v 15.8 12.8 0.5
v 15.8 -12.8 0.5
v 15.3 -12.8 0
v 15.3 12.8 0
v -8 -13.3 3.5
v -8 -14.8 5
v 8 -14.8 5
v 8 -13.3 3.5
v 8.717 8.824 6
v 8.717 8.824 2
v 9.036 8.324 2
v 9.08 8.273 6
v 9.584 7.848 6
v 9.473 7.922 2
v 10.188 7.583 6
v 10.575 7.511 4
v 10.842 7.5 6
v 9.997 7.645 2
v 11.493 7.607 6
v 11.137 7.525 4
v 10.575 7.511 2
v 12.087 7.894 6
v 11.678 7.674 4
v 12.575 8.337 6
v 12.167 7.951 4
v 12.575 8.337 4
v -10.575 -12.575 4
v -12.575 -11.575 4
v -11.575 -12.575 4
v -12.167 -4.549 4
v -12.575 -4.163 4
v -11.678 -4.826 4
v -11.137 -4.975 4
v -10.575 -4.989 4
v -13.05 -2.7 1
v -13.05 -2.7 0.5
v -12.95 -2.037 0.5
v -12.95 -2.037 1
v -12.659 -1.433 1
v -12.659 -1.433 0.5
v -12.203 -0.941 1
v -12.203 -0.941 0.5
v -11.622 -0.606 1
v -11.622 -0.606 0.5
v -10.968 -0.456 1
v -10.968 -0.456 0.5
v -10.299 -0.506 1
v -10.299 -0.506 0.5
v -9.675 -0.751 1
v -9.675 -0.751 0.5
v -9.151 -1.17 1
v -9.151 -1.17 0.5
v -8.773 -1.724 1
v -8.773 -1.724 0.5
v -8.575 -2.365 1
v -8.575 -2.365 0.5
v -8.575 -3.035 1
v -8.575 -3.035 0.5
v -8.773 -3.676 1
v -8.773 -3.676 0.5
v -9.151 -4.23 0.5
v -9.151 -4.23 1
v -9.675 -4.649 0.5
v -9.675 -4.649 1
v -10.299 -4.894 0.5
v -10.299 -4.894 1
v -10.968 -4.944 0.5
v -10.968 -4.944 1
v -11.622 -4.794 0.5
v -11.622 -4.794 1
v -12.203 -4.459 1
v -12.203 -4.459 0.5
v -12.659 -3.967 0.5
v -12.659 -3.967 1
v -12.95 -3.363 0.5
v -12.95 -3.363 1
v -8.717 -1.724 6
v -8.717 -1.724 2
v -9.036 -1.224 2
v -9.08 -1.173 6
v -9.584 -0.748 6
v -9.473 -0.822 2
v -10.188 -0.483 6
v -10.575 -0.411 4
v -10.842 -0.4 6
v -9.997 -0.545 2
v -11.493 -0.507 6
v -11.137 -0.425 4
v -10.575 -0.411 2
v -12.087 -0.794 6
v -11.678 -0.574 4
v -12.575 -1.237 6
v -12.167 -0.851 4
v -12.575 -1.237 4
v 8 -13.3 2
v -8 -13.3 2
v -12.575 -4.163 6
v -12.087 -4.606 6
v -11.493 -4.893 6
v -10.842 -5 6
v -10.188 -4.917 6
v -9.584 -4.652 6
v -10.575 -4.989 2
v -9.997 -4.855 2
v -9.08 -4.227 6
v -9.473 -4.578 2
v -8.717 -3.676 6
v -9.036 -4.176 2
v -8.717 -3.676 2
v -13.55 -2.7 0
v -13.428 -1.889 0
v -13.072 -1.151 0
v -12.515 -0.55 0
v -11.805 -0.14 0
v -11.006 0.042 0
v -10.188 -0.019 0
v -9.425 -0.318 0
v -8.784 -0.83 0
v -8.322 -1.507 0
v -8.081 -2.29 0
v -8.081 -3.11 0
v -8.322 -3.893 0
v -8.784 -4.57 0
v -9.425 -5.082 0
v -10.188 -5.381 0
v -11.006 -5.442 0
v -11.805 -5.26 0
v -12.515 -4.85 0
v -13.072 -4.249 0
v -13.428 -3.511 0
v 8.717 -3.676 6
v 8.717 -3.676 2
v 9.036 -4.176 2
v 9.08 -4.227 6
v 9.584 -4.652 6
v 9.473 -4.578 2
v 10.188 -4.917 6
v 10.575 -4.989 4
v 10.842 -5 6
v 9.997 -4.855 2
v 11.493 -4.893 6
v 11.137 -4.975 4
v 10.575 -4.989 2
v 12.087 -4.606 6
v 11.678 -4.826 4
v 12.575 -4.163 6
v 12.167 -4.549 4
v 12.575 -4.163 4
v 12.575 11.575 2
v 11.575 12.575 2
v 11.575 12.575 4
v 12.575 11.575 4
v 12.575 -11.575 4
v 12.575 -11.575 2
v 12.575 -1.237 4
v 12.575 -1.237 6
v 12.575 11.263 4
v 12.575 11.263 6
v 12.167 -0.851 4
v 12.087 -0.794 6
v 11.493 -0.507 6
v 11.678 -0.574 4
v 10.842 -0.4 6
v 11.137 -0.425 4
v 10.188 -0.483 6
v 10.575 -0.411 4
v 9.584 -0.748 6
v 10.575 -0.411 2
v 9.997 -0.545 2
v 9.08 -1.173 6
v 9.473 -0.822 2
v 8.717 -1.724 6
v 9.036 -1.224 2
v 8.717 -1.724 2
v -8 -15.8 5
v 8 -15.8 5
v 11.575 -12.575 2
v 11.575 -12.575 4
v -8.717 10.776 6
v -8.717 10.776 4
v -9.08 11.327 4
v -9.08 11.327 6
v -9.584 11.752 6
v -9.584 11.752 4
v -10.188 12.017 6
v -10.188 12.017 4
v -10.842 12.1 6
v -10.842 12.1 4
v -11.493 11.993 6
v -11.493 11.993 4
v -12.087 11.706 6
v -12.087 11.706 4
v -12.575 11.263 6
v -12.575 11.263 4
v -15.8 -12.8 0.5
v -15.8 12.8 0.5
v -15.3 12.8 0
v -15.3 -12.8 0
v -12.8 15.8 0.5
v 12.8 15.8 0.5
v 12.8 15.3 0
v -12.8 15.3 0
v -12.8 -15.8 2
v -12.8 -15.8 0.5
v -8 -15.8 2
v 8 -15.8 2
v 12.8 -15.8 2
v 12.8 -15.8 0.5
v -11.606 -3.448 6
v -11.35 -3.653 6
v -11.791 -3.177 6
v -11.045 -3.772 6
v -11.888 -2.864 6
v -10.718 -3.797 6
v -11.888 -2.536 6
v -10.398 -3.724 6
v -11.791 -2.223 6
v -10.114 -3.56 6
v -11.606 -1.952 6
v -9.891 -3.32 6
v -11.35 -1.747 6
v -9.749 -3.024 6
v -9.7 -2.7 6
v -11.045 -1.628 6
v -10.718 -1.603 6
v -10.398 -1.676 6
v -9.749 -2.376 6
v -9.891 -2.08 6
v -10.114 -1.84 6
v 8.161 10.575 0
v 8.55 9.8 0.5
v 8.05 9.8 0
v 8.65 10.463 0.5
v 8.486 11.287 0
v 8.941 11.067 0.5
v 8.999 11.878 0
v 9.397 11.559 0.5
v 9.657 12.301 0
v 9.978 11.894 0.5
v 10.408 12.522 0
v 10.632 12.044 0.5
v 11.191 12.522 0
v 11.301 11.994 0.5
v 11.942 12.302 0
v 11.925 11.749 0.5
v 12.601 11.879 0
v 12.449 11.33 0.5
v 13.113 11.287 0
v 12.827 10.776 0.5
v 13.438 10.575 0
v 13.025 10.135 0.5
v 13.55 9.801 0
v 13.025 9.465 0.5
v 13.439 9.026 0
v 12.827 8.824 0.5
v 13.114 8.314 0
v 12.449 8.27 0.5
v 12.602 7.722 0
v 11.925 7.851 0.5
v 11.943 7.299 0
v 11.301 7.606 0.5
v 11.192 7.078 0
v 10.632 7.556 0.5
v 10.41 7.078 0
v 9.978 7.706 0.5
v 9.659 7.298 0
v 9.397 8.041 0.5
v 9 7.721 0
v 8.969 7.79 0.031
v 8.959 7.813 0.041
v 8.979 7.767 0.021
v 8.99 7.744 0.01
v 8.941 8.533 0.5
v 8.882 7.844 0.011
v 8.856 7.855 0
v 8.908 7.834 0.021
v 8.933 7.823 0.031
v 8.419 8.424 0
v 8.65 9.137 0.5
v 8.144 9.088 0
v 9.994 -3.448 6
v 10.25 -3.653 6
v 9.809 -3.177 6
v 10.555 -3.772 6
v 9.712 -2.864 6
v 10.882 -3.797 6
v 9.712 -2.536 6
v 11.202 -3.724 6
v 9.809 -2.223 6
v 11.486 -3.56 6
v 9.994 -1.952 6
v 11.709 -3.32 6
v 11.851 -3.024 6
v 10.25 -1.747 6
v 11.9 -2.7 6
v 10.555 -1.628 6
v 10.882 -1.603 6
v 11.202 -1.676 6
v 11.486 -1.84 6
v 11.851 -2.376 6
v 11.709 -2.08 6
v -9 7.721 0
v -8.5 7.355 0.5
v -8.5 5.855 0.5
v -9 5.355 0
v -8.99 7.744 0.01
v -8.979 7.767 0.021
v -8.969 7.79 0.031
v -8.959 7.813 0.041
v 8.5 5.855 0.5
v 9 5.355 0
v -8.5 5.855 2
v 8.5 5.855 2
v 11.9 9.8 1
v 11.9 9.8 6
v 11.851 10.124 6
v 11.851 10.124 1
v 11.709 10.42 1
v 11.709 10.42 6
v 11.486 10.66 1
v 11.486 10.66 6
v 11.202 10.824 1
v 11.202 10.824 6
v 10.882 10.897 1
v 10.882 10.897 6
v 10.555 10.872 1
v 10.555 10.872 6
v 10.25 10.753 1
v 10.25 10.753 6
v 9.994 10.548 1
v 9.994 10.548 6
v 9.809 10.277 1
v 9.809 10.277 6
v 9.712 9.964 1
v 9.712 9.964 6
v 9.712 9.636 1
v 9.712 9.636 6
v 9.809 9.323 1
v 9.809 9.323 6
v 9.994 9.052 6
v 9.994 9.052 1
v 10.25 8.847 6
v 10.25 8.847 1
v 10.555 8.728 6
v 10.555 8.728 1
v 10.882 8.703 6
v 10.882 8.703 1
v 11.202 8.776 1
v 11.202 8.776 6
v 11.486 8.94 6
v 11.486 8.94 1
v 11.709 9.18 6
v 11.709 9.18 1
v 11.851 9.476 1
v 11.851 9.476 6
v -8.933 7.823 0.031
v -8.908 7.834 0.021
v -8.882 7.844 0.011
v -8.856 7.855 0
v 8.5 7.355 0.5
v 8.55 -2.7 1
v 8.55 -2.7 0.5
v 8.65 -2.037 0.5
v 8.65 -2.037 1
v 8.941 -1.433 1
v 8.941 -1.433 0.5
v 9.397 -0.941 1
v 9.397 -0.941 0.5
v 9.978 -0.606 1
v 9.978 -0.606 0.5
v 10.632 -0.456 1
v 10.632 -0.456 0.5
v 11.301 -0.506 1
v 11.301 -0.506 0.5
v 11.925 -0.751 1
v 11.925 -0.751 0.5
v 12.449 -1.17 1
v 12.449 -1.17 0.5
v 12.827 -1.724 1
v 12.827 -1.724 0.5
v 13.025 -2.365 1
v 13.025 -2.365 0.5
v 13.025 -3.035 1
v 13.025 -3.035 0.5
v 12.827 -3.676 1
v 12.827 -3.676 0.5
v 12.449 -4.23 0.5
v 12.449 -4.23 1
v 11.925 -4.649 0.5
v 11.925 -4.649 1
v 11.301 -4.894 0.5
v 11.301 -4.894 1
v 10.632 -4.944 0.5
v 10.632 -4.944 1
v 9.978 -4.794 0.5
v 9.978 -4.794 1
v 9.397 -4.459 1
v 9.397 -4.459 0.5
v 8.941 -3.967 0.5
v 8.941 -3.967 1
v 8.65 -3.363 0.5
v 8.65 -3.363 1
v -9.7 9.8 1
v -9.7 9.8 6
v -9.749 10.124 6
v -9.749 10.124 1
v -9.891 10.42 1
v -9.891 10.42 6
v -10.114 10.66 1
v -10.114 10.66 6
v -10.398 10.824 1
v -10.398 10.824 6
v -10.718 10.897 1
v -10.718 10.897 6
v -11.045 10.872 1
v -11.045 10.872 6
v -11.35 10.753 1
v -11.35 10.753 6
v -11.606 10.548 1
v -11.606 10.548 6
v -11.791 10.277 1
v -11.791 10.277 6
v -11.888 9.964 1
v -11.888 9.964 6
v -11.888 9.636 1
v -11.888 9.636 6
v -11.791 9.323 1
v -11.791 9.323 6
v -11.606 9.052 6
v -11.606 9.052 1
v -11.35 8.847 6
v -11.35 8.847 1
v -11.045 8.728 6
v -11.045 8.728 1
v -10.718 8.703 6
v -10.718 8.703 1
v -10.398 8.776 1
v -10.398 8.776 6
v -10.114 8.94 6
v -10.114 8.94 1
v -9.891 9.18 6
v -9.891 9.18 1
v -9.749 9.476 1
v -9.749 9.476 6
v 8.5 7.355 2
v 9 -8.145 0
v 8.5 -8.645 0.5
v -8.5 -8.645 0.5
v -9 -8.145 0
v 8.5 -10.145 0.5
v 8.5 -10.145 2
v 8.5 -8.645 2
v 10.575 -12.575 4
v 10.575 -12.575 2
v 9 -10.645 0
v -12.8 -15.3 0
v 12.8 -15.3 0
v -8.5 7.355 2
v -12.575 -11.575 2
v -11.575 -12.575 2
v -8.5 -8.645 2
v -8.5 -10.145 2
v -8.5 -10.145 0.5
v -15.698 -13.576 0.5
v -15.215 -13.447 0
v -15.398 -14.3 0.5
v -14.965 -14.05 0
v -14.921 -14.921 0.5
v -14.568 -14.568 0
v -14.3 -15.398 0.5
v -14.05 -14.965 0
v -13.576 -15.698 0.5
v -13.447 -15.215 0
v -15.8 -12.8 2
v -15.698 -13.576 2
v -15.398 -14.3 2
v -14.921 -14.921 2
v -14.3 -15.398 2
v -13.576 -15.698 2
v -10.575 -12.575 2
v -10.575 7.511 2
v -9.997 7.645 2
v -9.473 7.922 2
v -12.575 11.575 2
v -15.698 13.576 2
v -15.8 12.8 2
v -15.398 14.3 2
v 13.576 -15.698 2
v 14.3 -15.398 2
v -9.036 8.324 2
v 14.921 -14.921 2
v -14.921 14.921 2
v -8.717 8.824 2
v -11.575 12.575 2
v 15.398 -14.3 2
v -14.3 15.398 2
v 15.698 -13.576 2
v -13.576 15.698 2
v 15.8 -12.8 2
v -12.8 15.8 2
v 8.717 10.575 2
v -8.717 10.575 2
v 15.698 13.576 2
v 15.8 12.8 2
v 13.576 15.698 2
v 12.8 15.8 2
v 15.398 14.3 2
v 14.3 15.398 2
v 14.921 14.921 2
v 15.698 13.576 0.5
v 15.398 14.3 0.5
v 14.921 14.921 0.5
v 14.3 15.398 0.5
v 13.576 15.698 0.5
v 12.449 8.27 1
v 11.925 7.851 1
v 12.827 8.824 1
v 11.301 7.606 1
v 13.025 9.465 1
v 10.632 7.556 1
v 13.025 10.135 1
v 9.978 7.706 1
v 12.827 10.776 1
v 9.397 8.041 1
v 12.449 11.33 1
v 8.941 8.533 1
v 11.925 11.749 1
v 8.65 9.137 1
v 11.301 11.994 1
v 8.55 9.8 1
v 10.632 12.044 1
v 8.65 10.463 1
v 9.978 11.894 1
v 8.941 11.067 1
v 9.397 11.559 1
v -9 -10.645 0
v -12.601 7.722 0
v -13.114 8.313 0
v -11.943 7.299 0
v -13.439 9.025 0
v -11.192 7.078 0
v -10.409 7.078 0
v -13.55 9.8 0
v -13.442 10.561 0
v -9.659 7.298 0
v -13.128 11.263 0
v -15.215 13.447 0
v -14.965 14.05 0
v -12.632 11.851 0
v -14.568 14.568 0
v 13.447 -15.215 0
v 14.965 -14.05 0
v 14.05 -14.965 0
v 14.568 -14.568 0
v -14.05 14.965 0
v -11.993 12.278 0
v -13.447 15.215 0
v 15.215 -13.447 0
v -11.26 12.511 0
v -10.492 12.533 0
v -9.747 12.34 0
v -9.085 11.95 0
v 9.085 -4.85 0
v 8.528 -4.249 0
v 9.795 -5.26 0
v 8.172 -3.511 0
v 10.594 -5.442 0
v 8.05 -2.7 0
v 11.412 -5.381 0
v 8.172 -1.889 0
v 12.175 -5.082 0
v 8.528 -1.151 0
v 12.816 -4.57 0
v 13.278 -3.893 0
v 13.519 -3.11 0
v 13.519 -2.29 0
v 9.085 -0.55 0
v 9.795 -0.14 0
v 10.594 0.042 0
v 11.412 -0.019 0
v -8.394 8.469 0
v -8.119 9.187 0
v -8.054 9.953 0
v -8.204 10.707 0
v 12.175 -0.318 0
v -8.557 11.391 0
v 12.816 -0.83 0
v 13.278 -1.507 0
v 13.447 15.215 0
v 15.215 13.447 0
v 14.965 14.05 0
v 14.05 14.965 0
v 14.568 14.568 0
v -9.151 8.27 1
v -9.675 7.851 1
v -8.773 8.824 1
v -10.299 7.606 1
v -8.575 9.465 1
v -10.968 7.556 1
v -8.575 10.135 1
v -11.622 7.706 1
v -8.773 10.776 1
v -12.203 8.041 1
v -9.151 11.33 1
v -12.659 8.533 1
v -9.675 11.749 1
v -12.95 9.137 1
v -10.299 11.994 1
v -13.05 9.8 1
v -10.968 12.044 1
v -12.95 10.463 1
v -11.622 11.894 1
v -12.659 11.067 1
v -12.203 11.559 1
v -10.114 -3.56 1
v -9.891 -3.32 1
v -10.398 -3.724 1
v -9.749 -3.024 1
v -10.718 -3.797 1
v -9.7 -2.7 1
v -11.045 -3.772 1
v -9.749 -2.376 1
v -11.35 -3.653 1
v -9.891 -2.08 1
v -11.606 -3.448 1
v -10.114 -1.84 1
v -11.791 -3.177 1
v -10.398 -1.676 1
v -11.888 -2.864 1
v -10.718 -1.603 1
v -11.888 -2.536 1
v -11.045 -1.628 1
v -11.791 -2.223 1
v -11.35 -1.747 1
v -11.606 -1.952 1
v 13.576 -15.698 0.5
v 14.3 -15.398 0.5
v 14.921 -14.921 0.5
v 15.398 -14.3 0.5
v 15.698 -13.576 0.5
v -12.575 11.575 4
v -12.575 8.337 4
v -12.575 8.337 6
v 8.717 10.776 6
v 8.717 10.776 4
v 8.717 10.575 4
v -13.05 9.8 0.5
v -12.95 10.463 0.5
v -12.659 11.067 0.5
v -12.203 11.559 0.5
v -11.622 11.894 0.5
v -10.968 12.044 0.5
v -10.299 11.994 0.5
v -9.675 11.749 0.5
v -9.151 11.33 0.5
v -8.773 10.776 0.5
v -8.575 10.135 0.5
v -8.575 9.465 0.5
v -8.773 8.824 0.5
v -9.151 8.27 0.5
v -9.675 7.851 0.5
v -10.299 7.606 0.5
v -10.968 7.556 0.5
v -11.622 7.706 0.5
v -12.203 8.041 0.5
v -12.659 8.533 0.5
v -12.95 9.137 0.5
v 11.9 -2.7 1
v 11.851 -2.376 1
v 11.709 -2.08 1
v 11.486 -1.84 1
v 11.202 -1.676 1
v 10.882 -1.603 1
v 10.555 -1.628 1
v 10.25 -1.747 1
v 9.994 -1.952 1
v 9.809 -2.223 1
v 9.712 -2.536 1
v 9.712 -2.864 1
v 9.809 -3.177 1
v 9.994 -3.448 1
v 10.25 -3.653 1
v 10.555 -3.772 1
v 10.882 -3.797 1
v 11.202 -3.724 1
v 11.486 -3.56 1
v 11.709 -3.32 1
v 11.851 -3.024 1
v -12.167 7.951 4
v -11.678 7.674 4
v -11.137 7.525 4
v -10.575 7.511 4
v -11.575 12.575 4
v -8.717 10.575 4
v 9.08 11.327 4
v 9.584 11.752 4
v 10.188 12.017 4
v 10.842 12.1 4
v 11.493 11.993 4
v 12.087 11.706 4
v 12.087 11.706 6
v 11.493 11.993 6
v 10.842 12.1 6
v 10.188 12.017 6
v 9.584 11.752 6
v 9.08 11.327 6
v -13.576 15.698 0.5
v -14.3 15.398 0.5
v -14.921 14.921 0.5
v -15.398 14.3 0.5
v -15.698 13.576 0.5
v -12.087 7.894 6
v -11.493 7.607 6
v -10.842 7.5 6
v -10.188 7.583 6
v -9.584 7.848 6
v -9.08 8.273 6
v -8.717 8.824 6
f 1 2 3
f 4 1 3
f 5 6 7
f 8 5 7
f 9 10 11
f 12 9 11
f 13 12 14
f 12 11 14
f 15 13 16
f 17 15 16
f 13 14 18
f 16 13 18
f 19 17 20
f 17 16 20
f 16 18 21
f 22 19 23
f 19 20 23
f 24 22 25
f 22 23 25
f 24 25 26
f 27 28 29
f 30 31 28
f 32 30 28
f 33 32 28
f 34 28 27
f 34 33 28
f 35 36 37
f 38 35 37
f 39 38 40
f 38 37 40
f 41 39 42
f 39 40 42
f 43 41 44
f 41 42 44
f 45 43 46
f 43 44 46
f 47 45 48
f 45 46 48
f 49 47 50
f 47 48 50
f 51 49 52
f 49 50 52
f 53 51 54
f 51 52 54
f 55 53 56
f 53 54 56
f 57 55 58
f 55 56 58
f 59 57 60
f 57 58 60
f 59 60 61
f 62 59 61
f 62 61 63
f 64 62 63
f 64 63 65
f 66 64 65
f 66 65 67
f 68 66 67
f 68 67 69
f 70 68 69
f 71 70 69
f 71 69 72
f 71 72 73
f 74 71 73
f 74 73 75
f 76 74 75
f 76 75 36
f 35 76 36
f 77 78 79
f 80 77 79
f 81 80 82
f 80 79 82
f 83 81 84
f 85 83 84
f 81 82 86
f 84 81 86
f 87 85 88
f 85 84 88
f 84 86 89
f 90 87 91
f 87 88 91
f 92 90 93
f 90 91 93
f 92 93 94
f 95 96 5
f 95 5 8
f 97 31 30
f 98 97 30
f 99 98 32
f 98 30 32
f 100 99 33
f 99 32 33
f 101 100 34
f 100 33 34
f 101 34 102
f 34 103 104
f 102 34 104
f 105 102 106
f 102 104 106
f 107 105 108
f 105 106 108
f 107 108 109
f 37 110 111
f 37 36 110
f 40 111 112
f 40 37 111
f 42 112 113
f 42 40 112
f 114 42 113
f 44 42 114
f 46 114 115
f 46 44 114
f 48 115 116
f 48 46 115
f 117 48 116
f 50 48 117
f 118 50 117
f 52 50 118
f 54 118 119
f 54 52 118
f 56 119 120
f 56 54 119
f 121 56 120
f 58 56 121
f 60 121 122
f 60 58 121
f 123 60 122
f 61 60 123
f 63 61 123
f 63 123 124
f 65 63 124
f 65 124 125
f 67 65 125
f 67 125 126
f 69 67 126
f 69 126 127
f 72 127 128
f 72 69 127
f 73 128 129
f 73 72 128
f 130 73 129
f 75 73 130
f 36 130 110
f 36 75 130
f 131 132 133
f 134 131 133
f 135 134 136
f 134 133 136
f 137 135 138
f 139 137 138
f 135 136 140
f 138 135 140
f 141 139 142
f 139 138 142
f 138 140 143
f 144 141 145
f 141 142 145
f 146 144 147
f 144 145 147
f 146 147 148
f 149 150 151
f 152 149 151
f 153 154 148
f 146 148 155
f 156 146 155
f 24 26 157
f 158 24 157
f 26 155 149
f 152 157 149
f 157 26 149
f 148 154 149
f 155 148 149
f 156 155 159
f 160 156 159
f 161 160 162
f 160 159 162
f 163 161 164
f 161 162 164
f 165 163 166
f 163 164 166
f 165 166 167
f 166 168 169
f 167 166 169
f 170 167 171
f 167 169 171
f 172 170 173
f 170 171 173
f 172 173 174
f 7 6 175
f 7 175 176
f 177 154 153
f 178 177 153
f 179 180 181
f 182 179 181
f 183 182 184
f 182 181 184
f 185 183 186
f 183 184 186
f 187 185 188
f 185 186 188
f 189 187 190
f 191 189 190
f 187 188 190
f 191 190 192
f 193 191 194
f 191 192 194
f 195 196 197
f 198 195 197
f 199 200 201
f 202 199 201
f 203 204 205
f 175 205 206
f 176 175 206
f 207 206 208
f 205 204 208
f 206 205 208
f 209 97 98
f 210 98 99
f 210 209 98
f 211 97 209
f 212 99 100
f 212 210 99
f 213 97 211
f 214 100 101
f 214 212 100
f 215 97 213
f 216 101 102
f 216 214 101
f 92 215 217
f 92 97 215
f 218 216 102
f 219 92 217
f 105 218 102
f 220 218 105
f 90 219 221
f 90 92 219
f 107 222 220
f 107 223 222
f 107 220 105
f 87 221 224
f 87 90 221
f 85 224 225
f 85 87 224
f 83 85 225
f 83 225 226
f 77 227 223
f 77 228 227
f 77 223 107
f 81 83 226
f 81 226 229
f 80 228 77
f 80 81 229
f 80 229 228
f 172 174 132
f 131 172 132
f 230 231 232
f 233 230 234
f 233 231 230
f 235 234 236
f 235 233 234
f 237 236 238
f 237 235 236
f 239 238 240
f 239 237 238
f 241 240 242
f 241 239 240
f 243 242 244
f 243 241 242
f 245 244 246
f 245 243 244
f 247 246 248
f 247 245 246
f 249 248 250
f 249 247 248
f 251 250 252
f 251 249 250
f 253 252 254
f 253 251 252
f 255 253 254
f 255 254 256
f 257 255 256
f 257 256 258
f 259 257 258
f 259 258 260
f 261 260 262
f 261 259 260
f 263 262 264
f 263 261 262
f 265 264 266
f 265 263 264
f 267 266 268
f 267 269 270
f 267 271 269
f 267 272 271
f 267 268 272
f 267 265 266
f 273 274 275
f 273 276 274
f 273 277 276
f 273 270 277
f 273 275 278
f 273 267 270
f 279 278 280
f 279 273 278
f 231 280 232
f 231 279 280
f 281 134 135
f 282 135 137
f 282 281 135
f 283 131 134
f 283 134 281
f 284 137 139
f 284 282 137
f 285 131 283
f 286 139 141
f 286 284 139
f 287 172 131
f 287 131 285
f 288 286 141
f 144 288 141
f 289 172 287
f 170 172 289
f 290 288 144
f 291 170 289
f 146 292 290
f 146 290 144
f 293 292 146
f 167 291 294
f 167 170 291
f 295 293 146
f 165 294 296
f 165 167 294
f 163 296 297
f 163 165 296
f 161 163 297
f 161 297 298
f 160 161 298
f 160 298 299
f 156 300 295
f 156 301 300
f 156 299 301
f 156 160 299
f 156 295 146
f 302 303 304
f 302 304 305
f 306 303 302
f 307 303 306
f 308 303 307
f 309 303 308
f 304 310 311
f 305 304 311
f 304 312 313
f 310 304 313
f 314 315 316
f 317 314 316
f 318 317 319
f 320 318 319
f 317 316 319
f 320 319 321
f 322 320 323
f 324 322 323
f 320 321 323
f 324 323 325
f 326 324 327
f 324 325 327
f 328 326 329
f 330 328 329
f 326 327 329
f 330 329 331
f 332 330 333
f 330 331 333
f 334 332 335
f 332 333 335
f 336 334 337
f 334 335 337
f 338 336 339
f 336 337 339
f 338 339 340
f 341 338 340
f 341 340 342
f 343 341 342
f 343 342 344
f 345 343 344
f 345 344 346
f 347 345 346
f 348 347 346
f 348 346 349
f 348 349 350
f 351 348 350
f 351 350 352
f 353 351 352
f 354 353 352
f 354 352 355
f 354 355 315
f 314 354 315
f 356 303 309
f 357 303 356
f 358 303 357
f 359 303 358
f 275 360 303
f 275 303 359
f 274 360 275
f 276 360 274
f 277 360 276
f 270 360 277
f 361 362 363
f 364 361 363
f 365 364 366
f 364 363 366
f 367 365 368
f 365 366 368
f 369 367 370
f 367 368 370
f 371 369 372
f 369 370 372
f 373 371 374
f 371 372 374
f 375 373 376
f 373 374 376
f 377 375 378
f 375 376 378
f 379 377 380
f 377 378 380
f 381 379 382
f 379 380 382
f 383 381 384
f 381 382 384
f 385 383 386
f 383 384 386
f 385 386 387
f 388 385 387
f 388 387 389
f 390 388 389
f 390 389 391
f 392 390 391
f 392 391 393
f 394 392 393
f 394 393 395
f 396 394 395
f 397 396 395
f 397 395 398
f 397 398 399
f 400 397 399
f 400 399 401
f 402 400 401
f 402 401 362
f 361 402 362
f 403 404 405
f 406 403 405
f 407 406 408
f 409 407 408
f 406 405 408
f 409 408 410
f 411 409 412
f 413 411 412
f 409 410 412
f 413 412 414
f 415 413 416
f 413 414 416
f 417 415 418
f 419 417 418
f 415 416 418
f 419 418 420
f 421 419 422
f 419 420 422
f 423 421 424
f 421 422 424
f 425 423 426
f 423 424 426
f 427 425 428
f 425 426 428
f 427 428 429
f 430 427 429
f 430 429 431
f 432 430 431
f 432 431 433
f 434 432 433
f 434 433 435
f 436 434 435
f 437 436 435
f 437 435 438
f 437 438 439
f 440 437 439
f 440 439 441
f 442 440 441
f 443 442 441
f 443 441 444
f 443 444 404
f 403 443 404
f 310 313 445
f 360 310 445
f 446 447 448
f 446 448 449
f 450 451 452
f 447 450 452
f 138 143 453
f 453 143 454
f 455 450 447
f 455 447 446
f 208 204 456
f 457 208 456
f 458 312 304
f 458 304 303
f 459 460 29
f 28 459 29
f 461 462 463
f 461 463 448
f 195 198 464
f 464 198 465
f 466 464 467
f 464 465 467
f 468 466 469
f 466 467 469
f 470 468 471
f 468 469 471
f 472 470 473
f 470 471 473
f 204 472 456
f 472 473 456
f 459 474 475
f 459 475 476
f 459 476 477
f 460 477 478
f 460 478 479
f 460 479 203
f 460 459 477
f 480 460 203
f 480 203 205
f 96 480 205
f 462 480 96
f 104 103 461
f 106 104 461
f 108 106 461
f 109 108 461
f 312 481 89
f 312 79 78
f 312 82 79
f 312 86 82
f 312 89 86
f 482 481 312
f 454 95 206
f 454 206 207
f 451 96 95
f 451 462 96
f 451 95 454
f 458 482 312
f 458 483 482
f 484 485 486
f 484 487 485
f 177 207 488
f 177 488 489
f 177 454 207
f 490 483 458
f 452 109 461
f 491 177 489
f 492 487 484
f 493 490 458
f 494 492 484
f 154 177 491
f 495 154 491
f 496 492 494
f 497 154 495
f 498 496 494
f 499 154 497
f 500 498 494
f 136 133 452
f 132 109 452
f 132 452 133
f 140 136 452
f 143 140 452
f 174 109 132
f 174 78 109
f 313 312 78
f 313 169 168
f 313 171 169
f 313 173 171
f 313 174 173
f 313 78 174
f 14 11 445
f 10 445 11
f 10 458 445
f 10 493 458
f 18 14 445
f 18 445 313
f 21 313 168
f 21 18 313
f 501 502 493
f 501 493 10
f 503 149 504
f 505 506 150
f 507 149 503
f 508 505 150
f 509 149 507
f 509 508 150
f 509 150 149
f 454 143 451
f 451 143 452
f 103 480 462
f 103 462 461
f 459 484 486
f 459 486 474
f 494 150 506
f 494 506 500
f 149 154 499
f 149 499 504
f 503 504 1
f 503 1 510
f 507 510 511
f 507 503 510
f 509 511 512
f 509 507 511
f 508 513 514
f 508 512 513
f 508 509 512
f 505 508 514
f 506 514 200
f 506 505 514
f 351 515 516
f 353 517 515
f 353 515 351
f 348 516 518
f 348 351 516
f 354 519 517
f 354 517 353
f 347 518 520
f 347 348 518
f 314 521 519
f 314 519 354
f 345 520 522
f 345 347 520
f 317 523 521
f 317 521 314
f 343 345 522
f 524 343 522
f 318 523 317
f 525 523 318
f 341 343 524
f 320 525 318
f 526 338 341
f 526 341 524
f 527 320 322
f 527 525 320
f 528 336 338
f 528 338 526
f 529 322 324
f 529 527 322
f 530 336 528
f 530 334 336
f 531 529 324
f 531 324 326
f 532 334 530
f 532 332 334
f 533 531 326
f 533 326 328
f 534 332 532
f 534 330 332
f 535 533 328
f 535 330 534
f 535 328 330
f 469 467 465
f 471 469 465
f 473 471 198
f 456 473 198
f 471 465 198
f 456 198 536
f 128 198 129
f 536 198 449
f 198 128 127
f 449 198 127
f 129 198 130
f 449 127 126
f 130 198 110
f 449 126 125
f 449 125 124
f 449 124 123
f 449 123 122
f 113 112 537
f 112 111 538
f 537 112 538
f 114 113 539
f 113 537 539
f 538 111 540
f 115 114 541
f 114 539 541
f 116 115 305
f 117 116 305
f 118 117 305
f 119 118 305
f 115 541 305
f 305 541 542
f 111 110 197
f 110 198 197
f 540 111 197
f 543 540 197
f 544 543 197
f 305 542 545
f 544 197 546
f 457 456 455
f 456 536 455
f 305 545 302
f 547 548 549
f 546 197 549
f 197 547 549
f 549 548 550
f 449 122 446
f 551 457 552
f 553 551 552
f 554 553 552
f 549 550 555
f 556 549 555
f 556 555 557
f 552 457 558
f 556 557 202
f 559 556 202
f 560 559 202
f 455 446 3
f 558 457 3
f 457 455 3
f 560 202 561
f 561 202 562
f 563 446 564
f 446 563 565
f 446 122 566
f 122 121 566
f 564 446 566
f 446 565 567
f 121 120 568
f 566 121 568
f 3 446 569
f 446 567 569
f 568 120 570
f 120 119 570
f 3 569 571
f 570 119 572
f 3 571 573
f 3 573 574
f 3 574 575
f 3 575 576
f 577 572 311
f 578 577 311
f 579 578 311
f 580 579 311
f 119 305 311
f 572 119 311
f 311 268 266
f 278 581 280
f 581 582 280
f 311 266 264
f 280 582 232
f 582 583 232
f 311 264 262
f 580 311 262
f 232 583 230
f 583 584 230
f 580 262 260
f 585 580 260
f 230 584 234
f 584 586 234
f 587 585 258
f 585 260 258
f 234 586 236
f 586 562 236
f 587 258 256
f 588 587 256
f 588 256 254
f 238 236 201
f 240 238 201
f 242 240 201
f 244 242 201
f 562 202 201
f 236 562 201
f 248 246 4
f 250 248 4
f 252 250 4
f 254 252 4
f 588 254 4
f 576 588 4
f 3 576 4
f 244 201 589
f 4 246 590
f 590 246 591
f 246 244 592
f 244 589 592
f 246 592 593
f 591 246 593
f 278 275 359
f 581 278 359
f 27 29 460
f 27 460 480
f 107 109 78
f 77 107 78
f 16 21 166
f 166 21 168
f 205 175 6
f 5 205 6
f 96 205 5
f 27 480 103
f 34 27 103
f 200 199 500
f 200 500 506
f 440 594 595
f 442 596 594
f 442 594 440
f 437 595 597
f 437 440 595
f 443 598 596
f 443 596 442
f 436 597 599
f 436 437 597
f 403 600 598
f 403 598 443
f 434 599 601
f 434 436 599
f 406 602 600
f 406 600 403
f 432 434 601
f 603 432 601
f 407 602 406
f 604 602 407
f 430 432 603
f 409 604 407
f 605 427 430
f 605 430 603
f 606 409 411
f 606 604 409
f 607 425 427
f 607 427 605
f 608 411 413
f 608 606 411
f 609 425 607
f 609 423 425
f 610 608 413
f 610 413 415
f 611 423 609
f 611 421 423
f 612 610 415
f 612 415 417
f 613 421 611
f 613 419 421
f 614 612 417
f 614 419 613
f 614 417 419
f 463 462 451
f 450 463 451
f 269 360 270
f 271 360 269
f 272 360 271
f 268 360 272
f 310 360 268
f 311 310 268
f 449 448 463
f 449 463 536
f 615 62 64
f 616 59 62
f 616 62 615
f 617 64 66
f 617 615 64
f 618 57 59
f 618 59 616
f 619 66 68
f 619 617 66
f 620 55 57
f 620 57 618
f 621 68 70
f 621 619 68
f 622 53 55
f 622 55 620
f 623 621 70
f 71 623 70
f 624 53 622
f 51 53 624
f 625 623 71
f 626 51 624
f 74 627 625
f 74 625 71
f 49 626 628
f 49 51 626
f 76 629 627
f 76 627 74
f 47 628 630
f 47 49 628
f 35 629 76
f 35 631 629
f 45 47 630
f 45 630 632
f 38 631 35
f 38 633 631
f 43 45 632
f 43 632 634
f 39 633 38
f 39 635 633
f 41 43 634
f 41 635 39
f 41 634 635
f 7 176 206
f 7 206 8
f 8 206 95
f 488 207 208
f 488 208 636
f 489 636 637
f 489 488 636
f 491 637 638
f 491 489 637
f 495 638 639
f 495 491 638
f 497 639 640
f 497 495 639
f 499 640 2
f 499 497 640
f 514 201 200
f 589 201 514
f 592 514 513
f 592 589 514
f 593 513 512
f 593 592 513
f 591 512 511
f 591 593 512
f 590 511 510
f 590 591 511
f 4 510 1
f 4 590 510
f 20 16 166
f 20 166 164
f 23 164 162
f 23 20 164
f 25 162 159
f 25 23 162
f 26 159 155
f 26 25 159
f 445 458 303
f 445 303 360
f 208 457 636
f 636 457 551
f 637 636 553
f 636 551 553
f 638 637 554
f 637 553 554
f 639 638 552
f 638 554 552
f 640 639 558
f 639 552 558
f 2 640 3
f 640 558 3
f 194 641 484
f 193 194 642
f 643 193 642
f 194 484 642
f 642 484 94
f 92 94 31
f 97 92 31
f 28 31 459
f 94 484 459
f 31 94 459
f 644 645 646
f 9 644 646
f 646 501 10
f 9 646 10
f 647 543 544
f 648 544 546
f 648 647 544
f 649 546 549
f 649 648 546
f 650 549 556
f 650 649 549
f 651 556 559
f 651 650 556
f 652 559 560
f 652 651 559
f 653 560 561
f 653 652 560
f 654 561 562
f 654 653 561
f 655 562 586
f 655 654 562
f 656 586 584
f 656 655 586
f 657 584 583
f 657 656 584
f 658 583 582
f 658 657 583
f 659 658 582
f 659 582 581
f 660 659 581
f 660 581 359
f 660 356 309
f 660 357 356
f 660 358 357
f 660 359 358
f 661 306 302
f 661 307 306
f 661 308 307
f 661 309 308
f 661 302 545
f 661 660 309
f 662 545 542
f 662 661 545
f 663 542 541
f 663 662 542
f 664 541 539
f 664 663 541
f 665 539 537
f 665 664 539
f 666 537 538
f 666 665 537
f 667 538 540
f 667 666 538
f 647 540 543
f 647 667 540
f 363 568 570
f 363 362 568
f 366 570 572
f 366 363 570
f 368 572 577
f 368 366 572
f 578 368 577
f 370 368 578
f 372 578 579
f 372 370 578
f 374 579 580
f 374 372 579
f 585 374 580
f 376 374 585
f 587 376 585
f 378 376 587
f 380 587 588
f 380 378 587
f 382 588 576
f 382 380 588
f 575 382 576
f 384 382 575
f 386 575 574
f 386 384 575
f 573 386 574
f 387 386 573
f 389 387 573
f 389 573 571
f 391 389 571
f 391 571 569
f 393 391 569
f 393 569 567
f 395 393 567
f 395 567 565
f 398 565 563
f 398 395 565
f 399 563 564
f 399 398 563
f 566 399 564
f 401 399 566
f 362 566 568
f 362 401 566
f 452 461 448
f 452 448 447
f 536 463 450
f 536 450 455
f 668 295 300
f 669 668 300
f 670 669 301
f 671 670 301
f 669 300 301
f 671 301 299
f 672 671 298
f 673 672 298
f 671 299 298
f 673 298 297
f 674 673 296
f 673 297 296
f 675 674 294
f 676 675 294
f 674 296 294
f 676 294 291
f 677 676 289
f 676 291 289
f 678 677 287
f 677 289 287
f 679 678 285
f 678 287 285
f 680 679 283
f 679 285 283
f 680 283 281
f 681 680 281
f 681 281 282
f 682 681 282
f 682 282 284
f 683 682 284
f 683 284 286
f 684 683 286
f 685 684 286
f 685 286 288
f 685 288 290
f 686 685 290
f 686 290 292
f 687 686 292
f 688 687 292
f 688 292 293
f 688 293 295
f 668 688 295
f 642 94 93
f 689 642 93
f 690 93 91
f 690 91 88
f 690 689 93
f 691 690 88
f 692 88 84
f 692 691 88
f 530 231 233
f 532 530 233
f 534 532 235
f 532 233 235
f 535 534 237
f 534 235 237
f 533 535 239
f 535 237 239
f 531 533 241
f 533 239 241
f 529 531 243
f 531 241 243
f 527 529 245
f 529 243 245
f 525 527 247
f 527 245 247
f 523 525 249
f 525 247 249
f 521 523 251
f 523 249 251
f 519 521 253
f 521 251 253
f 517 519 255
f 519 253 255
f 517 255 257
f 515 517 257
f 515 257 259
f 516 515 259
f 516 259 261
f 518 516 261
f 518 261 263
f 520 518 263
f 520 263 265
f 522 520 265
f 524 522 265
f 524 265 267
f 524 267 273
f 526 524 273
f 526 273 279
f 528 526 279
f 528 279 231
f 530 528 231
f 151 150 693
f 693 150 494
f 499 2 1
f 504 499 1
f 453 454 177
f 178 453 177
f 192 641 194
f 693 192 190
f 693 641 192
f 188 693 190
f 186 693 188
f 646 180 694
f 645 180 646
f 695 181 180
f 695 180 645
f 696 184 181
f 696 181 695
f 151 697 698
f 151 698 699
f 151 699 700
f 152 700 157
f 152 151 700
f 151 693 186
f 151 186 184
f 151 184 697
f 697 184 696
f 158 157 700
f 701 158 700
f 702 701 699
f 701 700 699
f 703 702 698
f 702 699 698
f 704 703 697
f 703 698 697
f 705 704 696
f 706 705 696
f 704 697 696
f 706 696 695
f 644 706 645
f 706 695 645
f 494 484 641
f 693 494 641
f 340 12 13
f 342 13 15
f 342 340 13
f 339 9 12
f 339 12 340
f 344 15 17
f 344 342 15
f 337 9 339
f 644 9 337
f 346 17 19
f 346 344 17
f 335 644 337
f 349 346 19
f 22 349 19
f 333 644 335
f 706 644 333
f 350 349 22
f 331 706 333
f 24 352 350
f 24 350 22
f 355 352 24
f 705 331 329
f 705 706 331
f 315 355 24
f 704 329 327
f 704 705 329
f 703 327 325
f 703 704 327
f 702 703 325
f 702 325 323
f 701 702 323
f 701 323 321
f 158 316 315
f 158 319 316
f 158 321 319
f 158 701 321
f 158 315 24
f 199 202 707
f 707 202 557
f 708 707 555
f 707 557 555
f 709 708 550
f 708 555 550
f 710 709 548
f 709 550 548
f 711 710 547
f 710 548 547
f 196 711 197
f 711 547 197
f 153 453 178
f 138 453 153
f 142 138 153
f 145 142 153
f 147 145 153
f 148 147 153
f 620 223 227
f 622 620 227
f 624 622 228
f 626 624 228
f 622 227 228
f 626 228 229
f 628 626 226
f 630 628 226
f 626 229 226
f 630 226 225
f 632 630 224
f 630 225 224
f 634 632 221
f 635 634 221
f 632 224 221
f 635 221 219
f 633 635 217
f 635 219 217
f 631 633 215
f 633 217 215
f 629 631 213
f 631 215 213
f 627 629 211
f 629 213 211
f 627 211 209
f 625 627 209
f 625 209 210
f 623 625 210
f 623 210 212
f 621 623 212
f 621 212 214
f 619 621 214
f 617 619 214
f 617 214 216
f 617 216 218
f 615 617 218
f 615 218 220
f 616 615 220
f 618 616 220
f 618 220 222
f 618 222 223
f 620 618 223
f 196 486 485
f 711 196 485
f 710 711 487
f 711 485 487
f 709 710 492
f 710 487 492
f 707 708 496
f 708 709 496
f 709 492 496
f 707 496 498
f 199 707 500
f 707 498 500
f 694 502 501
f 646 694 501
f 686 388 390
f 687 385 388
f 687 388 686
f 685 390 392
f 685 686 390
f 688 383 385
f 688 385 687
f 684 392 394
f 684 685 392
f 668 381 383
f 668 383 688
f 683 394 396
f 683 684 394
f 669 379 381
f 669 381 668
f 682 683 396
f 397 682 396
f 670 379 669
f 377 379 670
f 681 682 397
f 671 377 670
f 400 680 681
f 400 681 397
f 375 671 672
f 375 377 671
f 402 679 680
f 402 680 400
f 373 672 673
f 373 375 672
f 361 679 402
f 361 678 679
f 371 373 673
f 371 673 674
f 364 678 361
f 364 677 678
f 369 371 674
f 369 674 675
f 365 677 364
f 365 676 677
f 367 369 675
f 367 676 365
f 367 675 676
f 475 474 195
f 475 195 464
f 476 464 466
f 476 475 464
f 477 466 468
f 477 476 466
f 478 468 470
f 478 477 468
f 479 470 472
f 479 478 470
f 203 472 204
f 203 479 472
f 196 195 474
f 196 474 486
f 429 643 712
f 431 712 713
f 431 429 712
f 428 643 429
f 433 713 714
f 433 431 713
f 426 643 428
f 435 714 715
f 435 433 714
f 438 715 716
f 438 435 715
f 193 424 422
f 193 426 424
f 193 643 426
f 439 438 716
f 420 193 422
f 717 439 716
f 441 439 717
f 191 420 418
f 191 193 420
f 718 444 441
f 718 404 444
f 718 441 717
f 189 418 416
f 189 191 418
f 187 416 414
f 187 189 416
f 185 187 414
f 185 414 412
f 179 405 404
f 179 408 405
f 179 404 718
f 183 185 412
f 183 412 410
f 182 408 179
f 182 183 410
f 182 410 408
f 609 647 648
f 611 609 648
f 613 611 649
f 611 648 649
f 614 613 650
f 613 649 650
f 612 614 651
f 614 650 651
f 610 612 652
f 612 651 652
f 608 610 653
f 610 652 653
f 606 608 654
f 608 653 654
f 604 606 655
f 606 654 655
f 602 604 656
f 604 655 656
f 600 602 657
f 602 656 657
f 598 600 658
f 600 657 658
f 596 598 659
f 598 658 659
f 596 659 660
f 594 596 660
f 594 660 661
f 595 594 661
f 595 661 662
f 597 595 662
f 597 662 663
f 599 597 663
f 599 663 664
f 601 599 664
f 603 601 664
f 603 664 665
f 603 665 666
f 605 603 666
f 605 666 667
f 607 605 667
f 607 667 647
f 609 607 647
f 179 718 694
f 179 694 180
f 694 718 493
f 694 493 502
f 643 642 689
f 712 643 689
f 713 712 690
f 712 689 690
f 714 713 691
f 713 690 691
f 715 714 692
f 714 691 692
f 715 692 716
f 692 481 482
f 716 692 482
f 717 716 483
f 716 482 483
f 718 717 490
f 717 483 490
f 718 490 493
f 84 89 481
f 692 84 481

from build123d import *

# Parameters (mm, degrees)
SKETCH2_W           = 31.6
SKETCH2_H           = 31.6
BOSS_EXTRUDE1_DEPTH = 2
FILLET1_R           = 3
BOSS_EXTRUDE2_DEPTH = 2
CHAMFER1_SIZE       = 1
SKETCH6_W           = 16
SKETCH6_H           = 2.5
BOSS_EXTRUDE3_DEPTH = 3
BOSS_EXTRUDE4_DEPTH = 4
SKETCH8_R           = 1.1
CUT_EXTRUDE1_DEPTH  = 8
SKETCH9_R           = 2.25
CUT_EXTRUDE2_DEPTH  = 1
SKETCH10_W          = 17
SKETCH10_H          = 1.5
CUT_EXTRUDE3_DEPTH  = 5
CHAMFER2_SIZE       = 0.5
CHAMFER3_SIZE       = 1.5


with BuildPart() as part:
    # Sketch2 → Boss-Extrude1 (new body)
    with BuildSketch(Plane.XY):
        Rectangle(SKETCH2_W, SKETCH2_H)
    extrude(amount=BOSS_EXTRUDE1_DEPTH)

    # Fillet1
    fillet1_edges = [part.edges().sort_by_distance(p)[0] for p in [
        (-15.8, 15.8, 1),
        (15.8, 15.8, 1),
        (15.8, -15.8, 1),
        (-15.8, -15.8, 1),
    ]]
    fillet(fillet1_edges, radius=FILLET1_R)

    # Sketch5 → Boss-Extrude2 (add)
    with BuildSketch(Plane.XY.offset(2)):
        Polygon((-10.575, -12.575), (-10.575, 10.575), (10.575, 10.575), (10.575, -12.575), (12.575, -12.575), (12.575, 12.575), (-12.575, 12.575), (-12.575, -12.575), align=None)
    extrude(amount=BOSS_EXTRUDE2_DEPTH)

    # Chamfer1
    chamfer1_edges = [part.edges().sort_by_distance(p)[0] for p in [
        (-12.575, 12.575, 3),
        (-12.575, -12.575, 3),
        (12.575, -12.575, 3),
        (12.575, 12.575, 3),
    ]]
    chamfer(chamfer1_edges, length=CHAMFER1_SIZE)

    # Sketch6 → Boss-Extrude3 (add)
    with BuildSketch(Plane.XY.offset(2)):
        with Locations((0, -14.55)):
            Rectangle(SKETCH6_W, SKETCH6_H)
    extrude(amount=BOSS_EXTRUDE3_DEPTH)

    # Sketch7 → Boss-Extrude4 (add)
    with BuildSketch(Plane.XY.offset(2)):
        with BuildLine():
            Line((12.575, -4.162660527), (12.575, -1.237339569))
            ThreePointArc((12.575, -1.237339569), (10.512267156, -0.418068914), (8.717472576, -1.723742534))
            Line((8.717472576, -1.723742534), (8.717472576, -3.676257561))
            ThreePointArc((8.717472576, -3.676257561), (10.512267156, -4.981931182), (12.575, -4.162660527))
        make_face()
        with BuildLine():
            Line((-12.575, -1.237339569), (-12.575, -4.162660527))
            ThreePointArc((-12.575, -4.162660527), (-10.512267156, -4.981931182), (-8.717472576, -3.676257561))
            Line((-8.717472576, -3.676257561), (-8.717472576, -1.723742534))
            ThreePointArc((-8.717472576, -1.723742534), (-10.512267156, -0.418068914), (-12.575, -1.237339569))
        make_face()
        with BuildLine():
            Line((-12.575, 11.26266067), (-12.575, 8.337339712))
            ThreePointArc((-12.575, 8.337339712), (-10.512267156, 7.518069057), (-8.717472576, 8.823742677))
            Line((-8.717472576, 8.823742677), (-8.717472576, 10.776257704))
            ThreePointArc((-8.717472576, 10.776257704), (-10.512267156, 12.081931325), (-12.575, 11.26266067))
        make_face()
        with BuildLine():
            Line((12.575, 8.337339712), (12.575, 11.26266067))
            ThreePointArc((12.575, 11.26266067), (10.512267156, 12.081931325), (8.717472576, 10.776257704))
            Line((8.717472576, 10.776257704), (8.717472576, 8.823742677))
            ThreePointArc((8.717472576, 8.823742677), (10.512267156, 7.518069057), (12.575, 8.337339712))
        make_face()
    extrude(amount=BOSS_EXTRUDE4_DEPTH)

    # Sketch8 → Cut-Extrude1 (cut)
    with BuildSketch(Plane.XY.offset(6)):
        with Locations((10.800000191, -2.700000048)):
            Circle(SKETCH8_R)
        with Locations((-10.800000191, -2.700000048)):
            Circle(SKETCH8_R)
        with Locations((-10.800000191, 9.800000191)):
            Circle(SKETCH8_R)
        with Locations((10.800000191, 9.800000191)):
            Circle(SKETCH8_R)
    extrude(amount=-CUT_EXTRUDE1_DEPTH, mode=Mode.SUBTRACT)

    # Sketch9 → Cut-Extrude2 (cut)
    with BuildSketch(Plane(origin=(0, 0, 0), x_dir=(-1, 0, 0), z_dir=(0, 0, -1))):
        with Locations((10.800000191, -2.700000048)):
            Circle(SKETCH9_R)
        with Locations((-10.800000191, -2.700000048)):
            Circle(SKETCH9_R)
        with Locations((-10.800000191, 9.800000191)):
            Circle(SKETCH9_R)
        with Locations((10.800000191, 9.800000191)):
            Circle(SKETCH9_R)
    extrude(amount=-CUT_EXTRUDE2_DEPTH, mode=Mode.SUBTRACT)

    # Sketch10 → Cut-Extrude3 (cut)
    with BuildSketch(Plane.XY.offset(2)):
        with Locations((0, -9.395499737)):
            Rectangle(SKETCH10_W, SKETCH10_H)
        with Locations((0, 6.604500263)):
            Rectangle(SKETCH10_W, SKETCH10_H)
    extrude(amount=-CUT_EXTRUDE3_DEPTH, mode=Mode.SUBTRACT)

    # Chamfer2
    # the kernel refuses this chamfer: 0.5 mm, written as the material it takes off along each edge
    with BuildSketch(Plane(origin=(12.8, 15.8, 0), x_dir=(0, 0.02749587661058563, 0.9996219169112968), z_dir=(-1, 0, 0)), Plane(origin=(-15.8, 12.8, 0), x_dir=(-0.02749587661058563, 0, 0.9996219169112968), z_dir=(0, -1, 0)), Plane(origin=(15.8, -12.8, 0), x_dir=(0.02749587661058563, 0, 0.9996219169112968), z_dir=(0, 1, 0)), Plane(origin=(-12.8, -15.8, 0), x_dir=(0, -0.02749587661058563, 0.9996219169112968), z_dir=(1, 0, 0))) as chamfer2_piece_1:
        Polygon((CHAMFER2_SIZE * 0.999621916911, -CHAMFER2_SIZE * 0.0274958766106), (-CHAMFER2_SIZE * 0.0274958766106, -CHAMFER2_SIZE * 0.999621916911), (0, 0), align=None)
    extrude(amount=25.6, mode=Mode.SUBTRACT)
    with BuildSketch(Plane(origin=(-12.8, 12.8, 0), x_dir=(0, 1, 0), z_dir=(1, 0, 0))) as chamfer2_piece_2:
        Polygon((3, CHAMFER2_SIZE), (3 - CHAMFER2_SIZE, 0), (3, 0), align=None)
    revolve(axis=Axis((-12.8, 12.8, 0), (0, 0, 1)), revolution_arc=90, mode=Mode.SUBTRACT)
    with BuildSketch(Plane(origin=(-12.8, -12.8, 0), x_dir=(-1, 0, 0), z_dir=(0, 1, 0))) as chamfer2_piece_3:
        Polygon((3, CHAMFER2_SIZE), (3 - CHAMFER2_SIZE, 0), (3, 0), align=None)
    revolve(axis=Axis((-12.8, -12.8, 0), (0, 0, 1)), revolution_arc=90, mode=Mode.SUBTRACT)
    with BuildSketch(Plane(origin=(12.8, -12.8, 0), x_dir=(0, -1, 0), z_dir=(-1, 0, 0))) as chamfer2_piece_4:
        Polygon((3, CHAMFER2_SIZE), (3 - CHAMFER2_SIZE, 0), (3, 0), align=None)
    revolve(axis=Axis((12.8, -12.8, 0), (0, 0, 1)), revolution_arc=90, mode=Mode.SUBTRACT)
    with BuildSketch(Plane(origin=(12.8, 12.8, 0), x_dir=(0, 1, 0), z_dir=(-1, 0, 0))) as chamfer2_piece_5:
        Polygon((3, -CHAMFER2_SIZE), (3 - CHAMFER2_SIZE, 0), (3, 0), align=None)
    revolve(axis=Axis((12.8, 12.8, 0), (0, 0, -1)), revolution_arc=90, mode=Mode.SUBTRACT)
    with BuildSketch(Plane(origin=(-10.800000191, -2.700000048, 0), x_dir=(-1, 0, 0), z_dir=(0, -1, 0))) as chamfer2_piece_6:
        Polygon((2.25 + CHAMFER2_SIZE, 0), (2.25, -CHAMFER2_SIZE), (2.25, 0), align=None)
    revolve(axis=Axis((-10.800000191, -2.700000048, 0), (0, 0, -1)), mode=Mode.SUBTRACT)
    with BuildSketch(Plane(origin=(10.800000191, -2.700000048, 0), x_dir=(-1, 0, 0), z_dir=(0, -1, 0))) as chamfer2_piece_7:
        Polygon((2.25 + CHAMFER2_SIZE, 0), (2.25, -CHAMFER2_SIZE), (2.25, 0), align=None)
    revolve(axis=Axis((10.800000191, -2.700000048, 0), (0, 0, -1)), mode=Mode.SUBTRACT)
    with BuildSketch(Plane(origin=(10.800000191, 9.800000191, 0), x_dir=(-1, 0, 0), z_dir=(0, -1, 0))) as chamfer2_piece_8:
        Polygon((2.25 + CHAMFER2_SIZE, 0), (2.25, -CHAMFER2_SIZE), (2.25, 0), align=None)
    revolve(axis=Axis((10.800000191, 9.800000191, 0), (0, 0, -1)), mode=Mode.SUBTRACT)
    with BuildSketch(Plane(origin=(-10.800000191, 9.800000191, 0), x_dir=(-1, 0, 0), z_dir=(0, -1, 0))) as chamfer2_piece_9:
        Polygon((2.25 + CHAMFER2_SIZE, 0), (2.25, -CHAMFER2_SIZE), (2.25, 0), align=None)
    revolve(axis=Axis((-10.800000191, 9.800000191, 0), (0, 0, -1)), mode=Mode.SUBTRACT)
    with BuildSketch(Plane(origin=(-8.5, -10.145499737, 0), x_dir=(0, 0.02749587661058563, 0.9996219169112968), z_dir=(1, 0, 0)), Plane(origin=(8.5, -8.645499737, 0), x_dir=(0, -0.02749587661058563, 0.9996219169112968), z_dir=(-1, 0, 0)), Plane(origin=(-8.5, 5.854500263, 0), x_dir=(0, 0.027495876610583895, 0.9996219169112968), z_dir=(1, 0, 0)), Plane(origin=(8.5, 7.354500263, 0), x_dir=(0, -0.027495876610587354, 0.9996219169112968), z_dir=(-1, 0, 0))) as chamfer2_piece_10:
        Polygon((CHAMFER2_SIZE * 0.999621916911, CHAMFER2_SIZE * 0.0274958766106), (-CHAMFER2_SIZE * 0.0274958766106, CHAMFER2_SIZE * 0.999621916911), (0, 0), align=None)
    extrude(amount=17, mode=Mode.SUBTRACT)
    with BuildSketch(Plane(origin=(8.5, -10.145499737, 0), x_dir=(-0.02749587661058563, 0, 0.9996219169112968), z_dir=(0, 1, 0)), Plane(origin=(-8.5, -8.645499737, 0), x_dir=(0.02749587661058563, 0, 0.9996219169112968), z_dir=(0, -1, 0)), Plane(origin=(8.5, 5.854500263, 0), x_dir=(-0.02749587661058563, 0, 0.9996219169112968), z_dir=(0, 1, 0)), Plane(origin=(-8.5, 7.354500263, 0), x_dir=(0.02749587661058563, 0, 0.9996219169112968), z_dir=(0, -1, 0))) as chamfer2_piece_11:
        Polygon((CHAMFER2_SIZE * 0.999621916911, CHAMFER2_SIZE * 0.0274958766106), (-CHAMFER2_SIZE * 0.0274958766106, CHAMFER2_SIZE * 0.999621916911), (0, 0), align=None)
    extrude(amount=1.5, mode=Mode.SUBTRACT)
    with BuildSketch(Plane(origin=(-8.5, -8.645499737, 0), x_dir=(0.02749587661058563, 0, 0.9996219169112968), z_dir=(0, -1, 0))) as chamfer2_piece_12a_section:
        Polygon((CHAMFER2_SIZE * 0.999621916911, CHAMFER2_SIZE * 0.0274958766106), (-CHAMFER2_SIZE * 0.0274958766106, CHAMFER2_SIZE * 0.999621916911), (0, 0), align=None)
    chamfer2_piece_12a = extrude(amount=2.785841494, mode=Mode.PRIVATE)
    chamfer2_piece_12a = split(chamfer2_piece_12a, bisect_by=Plane(origin=(-8.664896813, -10.145499737, 0.164896813), z_dir=(0, -1, 0)), keep=Keep.TOP, mode=Mode.PRIVATE)
    with BuildSketch(Plane(origin=(-9.785841494, -10.145499737, 0), x_dir=(0, 0.02749587661058563, 0.9996219169112968), z_dir=(1, 0, 0))) as chamfer2_piece_12b_section:
        Polygon((CHAMFER2_SIZE * 0.999621916911, CHAMFER2_SIZE * 0.0274958766106), (-CHAMFER2_SIZE * 0.0274958766106, CHAMFER2_SIZE * 0.999621916911), (0, 0), align=None)
    chamfer2_piece_12b = extrude(amount=18.285841494, mode=Mode.PRIVATE)
    chamfer2_piece_12b = split(chamfer2_piece_12b, bisect_by=Plane(origin=(-8.5, -10.310396551, 0.164896813), z_dir=(-1, 0, 0)), keep=Keep.TOP, mode=Mode.PRIVATE)
    chamfer2_piece_12 = chamfer2_piece_12a & chamfer2_piece_12b
    add(chamfer2_piece_12, mode=Mode.SUBTRACT)
    with BuildSketch(Plane(origin=(-8.5, -10.145499737, 0), x_dir=(0, 0.02749587661058563, 0.9996219169112968), z_dir=(1, 0, 0))) as chamfer2_piece_13a_section:
        Polygon((CHAMFER2_SIZE * 0.999621916911, CHAMFER2_SIZE * 0.0274958766106), (-CHAMFER2_SIZE * 0.0274958766106, CHAMFER2_SIZE * 0.999621916911), (0, 0), align=None)
    chamfer2_piece_13a = extrude(amount=18.285841494, mode=Mode.PRIVATE)
    chamfer2_piece_13a = split(chamfer2_piece_13a, bisect_by=Plane(origin=(8.5, -10.310396551, 0.164896813), z_dir=(1, 0, 0)), keep=Keep.TOP, mode=Mode.PRIVATE)
    with BuildSketch(Plane(origin=(8.5, -11.431341231, 0), x_dir=(-0.02749587661058563, 0, 0.9996219169112968), z_dir=(0, 1, 0))) as chamfer2_piece_13b_section:
        Polygon((CHAMFER2_SIZE * 0.999621916911, CHAMFER2_SIZE * 0.0274958766106), (-CHAMFER2_SIZE * 0.0274958766106, CHAMFER2_SIZE * 0.999621916911), (0, 0), align=None)
    chamfer2_piece_13b = extrude(amount=2.785841494, mode=Mode.PRIVATE)
    chamfer2_piece_13b = split(chamfer2_piece_13b, bisect_by=Plane(origin=(8.664896813, -10.145499737, 0.164896813), z_dir=(0, -1, 0)), keep=Keep.TOP, mode=Mode.PRIVATE)
    chamfer2_piece_13 = chamfer2_piece_13a & chamfer2_piece_13b
    add(chamfer2_piece_13, mode=Mode.SUBTRACT)
    with BuildSketch(Plane(origin=(9.785841494, -8.645499737, 0), x_dir=(0, -0.02749587661058563, 0.9996219169112968), z_dir=(-1, 0, 0))) as chamfer2_piece_14a_section:
        Polygon((CHAMFER2_SIZE * 0.999621916911, CHAMFER2_SIZE * 0.0274958766106), (-CHAMFER2_SIZE * 0.0274958766106, CHAMFER2_SIZE * 0.999621916911), (0, 0), align=None)
    chamfer2_piece_14a = extrude(amount=18.285841494, mode=Mode.PRIVATE)
    chamfer2_piece_14a = split(chamfer2_piece_14a, bisect_by=Plane(origin=(8.5, -8.480602924, 0.164896813), z_dir=(1, 0, 0)), keep=Keep.TOP, mode=Mode.PRIVATE)
    with BuildSketch(Plane(origin=(8.5, -10.145499737, 0), x_dir=(-0.02749587661058563, 0, 0.9996219169112968), z_dir=(0, 1, 0))) as chamfer2_piece_14b_section:
        Polygon((CHAMFER2_SIZE * 0.999621916911, CHAMFER2_SIZE * 0.0274958766106), (-CHAMFER2_SIZE * 0.0274958766106, CHAMFER2_SIZE * 0.999621916911), (0, 0), align=None)
    chamfer2_piece_14b = extrude(amount=2.785841494, mode=Mode.PRIVATE)
    chamfer2_piece_14b = split(chamfer2_piece_14b, bisect_by=Plane(origin=(8.664896813, -8.645499737, 0.164896813), z_dir=(0, 1, 0)), keep=Keep.TOP, mode=Mode.PRIVATE)
    chamfer2_piece_14 = chamfer2_piece_14a & chamfer2_piece_14b
    add(chamfer2_piece_14, mode=Mode.SUBTRACT)
    with BuildSketch(Plane(origin=(8.5, -8.645499737, 0), x_dir=(0, -0.02749587661058563, 0.9996219169112968), z_dir=(-1, 0, 0))) as chamfer2_piece_15a_section:
        Polygon((CHAMFER2_SIZE * 0.999621916911, CHAMFER2_SIZE * 0.0274958766106), (-CHAMFER2_SIZE * 0.0274958766106, CHAMFER2_SIZE * 0.999621916911), (0, 0), align=None)
    chamfer2_piece_15a = extrude(amount=18.285841494, mode=Mode.PRIVATE)
    chamfer2_piece_15a = split(chamfer2_piece_15a, bisect_by=Plane(origin=(-8.5, -8.480602924, 0.164896813), z_dir=(-1, 0, 0)), keep=Keep.TOP, mode=Mode.PRIVATE)
    with BuildSketch(Plane(origin=(-8.5, -7.359658243, 0), x_dir=(0.02749587661058563, 0, 0.9996219169112968), z_dir=(0, -1, 0))) as chamfer2_piece_15b_section:
        Polygon((CHAMFER2_SIZE * 0.999621916911, CHAMFER2_SIZE * 0.0274958766106), (-CHAMFER2_SIZE * 0.0274958766106, CHAMFER2_SIZE * 0.999621916911), (0, 0), align=None)
    chamfer2_piece_15b = extrude(amount=2.785841494, mode=Mode.PRIVATE)
    chamfer2_piece_15b = split(chamfer2_piece_15b, bisect_by=Plane(origin=(-8.664896813, -8.645499737, 0.164896813), z_dir=(0, 1, 0)), keep=Keep.TOP, mode=Mode.PRIVATE)
    chamfer2_piece_15 = chamfer2_piece_15a & chamfer2_piece_15b
    add(chamfer2_piece_15, mode=Mode.SUBTRACT)
    with BuildSketch(Plane(origin=(-8.5, 7.354500263, 0), x_dir=(0.02749587661058563, 0, 0.9996219169112968), z_dir=(0, -1, 0))) as chamfer2_piece_16a_section:
        Polygon((CHAMFER2_SIZE * 0.999621916911, CHAMFER2_SIZE * 0.0274958766106), (-CHAMFER2_SIZE * 0.0274958766106, CHAMFER2_SIZE * 0.999621916911), (0, 0), align=None)
    chamfer2_piece_16a = extrude(amount=2.785841494, mode=Mode.PRIVATE)
    chamfer2_piece_16a = split(chamfer2_piece_16a, bisect_by=Plane(origin=(-8.664896813, 5.854500263, 0.164896813), z_dir=(0, -1, 0)), keep=Keep.TOP, mode=Mode.PRIVATE)
    with BuildSketch(Plane(origin=(-9.785841494, 5.854500263, 0), x_dir=(0, 0.02749587661058563, 0.9996219169112968), z_dir=(1, 0, 0))) as chamfer2_piece_16b_section:
        Polygon((CHAMFER2_SIZE * 0.999621916911, CHAMFER2_SIZE * 0.0274958766106), (-CHAMFER2_SIZE * 0.0274958766106, CHAMFER2_SIZE * 0.999621916911), (0, 0), align=None)
    chamfer2_piece_16b = extrude(amount=18.285841494, mode=Mode.PRIVATE)
    chamfer2_piece_16b = split(chamfer2_piece_16b, bisect_by=Plane(origin=(-8.5, 5.689603449, 0.164896813), z_dir=(-1, 0, 0)), keep=Keep.TOP, mode=Mode.PRIVATE)
    chamfer2_piece_16 = chamfer2_piece_16a & chamfer2_piece_16b
    add(chamfer2_piece_16, mode=Mode.SUBTRACT)
    with BuildSketch(Plane(origin=(-8.5, 5.854500263, 0), x_dir=(0, 0.027495876610583895, 0.9996219169112968), z_dir=(1, 0, 0))) as chamfer2_piece_17a_section:
        Polygon((CHAMFER2_SIZE * 0.999621916911, CHAMFER2_SIZE * 0.0274958766106), (-CHAMFER2_SIZE * 0.0274958766106, CHAMFER2_SIZE * 0.999621916911), (0, 0), align=None)
    chamfer2_piece_17a = extrude(amount=18.285841494, mode=Mode.PRIVATE)
    chamfer2_piece_17a = split(chamfer2_piece_17a, bisect_by=Plane(origin=(8.5, 5.689603449, 0.164896813), z_dir=(1, 0, 0)), keep=Keep.TOP, mode=Mode.PRIVATE)
    with BuildSketch(Plane(origin=(8.5, 4.568658769, 0), x_dir=(-0.02749587661058563, 0, 0.9996219169112968), z_dir=(0, 1, 0))) as chamfer2_piece_17b_section:
        Polygon((CHAMFER2_SIZE * 0.999621916911, CHAMFER2_SIZE * 0.0274958766106), (-CHAMFER2_SIZE * 0.0274958766106, CHAMFER2_SIZE * 0.999621916911), (0, 0), align=None)
    chamfer2_piece_17b = extrude(amount=2.785841494, mode=Mode.PRIVATE)
    chamfer2_piece_17b = split(chamfer2_piece_17b, bisect_by=Plane(origin=(8.664896813, 5.854500263, 0.164896813), z_dir=(0, -1, 0)), keep=Keep.TOP, mode=Mode.PRIVATE)
    chamfer2_piece_17 = chamfer2_piece_17a & chamfer2_piece_17b
    add(chamfer2_piece_17, mode=Mode.SUBTRACT)
    with BuildSketch(Plane(origin=(9.785841494, 7.354500263, 0), x_dir=(0, -0.02749587661058563, 0.9996219169112968), z_dir=(-1, 0, 0))) as chamfer2_piece_18a_section:
        Polygon((CHAMFER2_SIZE * 0.999621916911, CHAMFER2_SIZE * 0.0274958766106), (-CHAMFER2_SIZE * 0.0274958766106, CHAMFER2_SIZE * 0.999621916911), (0, 0), align=None)
    chamfer2_piece_18a = extrude(amount=18.285841494, mode=Mode.PRIVATE)
    chamfer2_piece_18a = split(chamfer2_piece_18a, bisect_by=Plane(origin=(8.5, 7.519397076, 0.164896813), z_dir=(1, 0, 0)), keep=Keep.TOP, mode=Mode.PRIVATE)
    with BuildSketch(Plane(origin=(8.5, 5.854500263, 0), x_dir=(-0.02749587661058563, 0, 0.9996219169112968), z_dir=(0, 1, 0))) as chamfer2_piece_18b_section:
        Polygon((CHAMFER2_SIZE * 0.999621916911, CHAMFER2_SIZE * 0.0274958766106), (-CHAMFER2_SIZE * 0.0274958766106, CHAMFER2_SIZE * 0.999621916911), (0, 0), align=None)
    chamfer2_piece_18b = extrude(amount=2.785841494, mode=Mode.PRIVATE)
    chamfer2_piece_18b = split(chamfer2_piece_18b, bisect_by=Plane(origin=(8.664896813, 7.354500263, 0.164896813), z_dir=(0, 1, 0)), keep=Keep.TOP, mode=Mode.PRIVATE)
    chamfer2_piece_18 = chamfer2_piece_18a & chamfer2_piece_18b
    add(chamfer2_piece_18, mode=Mode.SUBTRACT)
    with BuildSketch(Plane(origin=(8.5, 7.354500263, 0), x_dir=(0, -0.027495876610587354, 0.9996219169112968), z_dir=(-1, 0, 0))) as chamfer2_piece_19a_section:
        Polygon((CHAMFER2_SIZE * 0.999621916911, CHAMFER2_SIZE * 0.0274958766106), (-CHAMFER2_SIZE * 0.0274958766106, CHAMFER2_SIZE * 0.999621916911), (0, 0), align=None)
    chamfer2_piece_19a = extrude(amount=18.285841494, mode=Mode.PRIVATE)
    chamfer2_piece_19a = split(chamfer2_piece_19a, bisect_by=Plane(origin=(-8.5, 7.519397076, 0.164896813), z_dir=(-1, 0, 0)), keep=Keep.TOP, mode=Mode.PRIVATE)
    with BuildSketch(Plane(origin=(-8.5, 8.640341757, 0), x_dir=(0.02749587661058563, 0, 0.9996219169112968), z_dir=(0, -1, 0))) as chamfer2_piece_19b_section:
        Polygon((CHAMFER2_SIZE * 0.999621916911, CHAMFER2_SIZE * 0.0274958766106), (-CHAMFER2_SIZE * 0.0274958766106, CHAMFER2_SIZE * 0.999621916911), (0, 0), align=None)
    chamfer2_piece_19b = extrude(amount=2.785841494, mode=Mode.PRIVATE)
    chamfer2_piece_19b = split(chamfer2_piece_19b, bisect_by=Plane(origin=(-8.664896813, 7.354500263, 0.164896813), z_dir=(0, 1, 0)), keep=Keep.TOP, mode=Mode.PRIVATE)
    chamfer2_piece_19 = chamfer2_piece_19a & chamfer2_piece_19b
    add(chamfer2_piece_19, mode=Mode.SUBTRACT)

    # Chamfer3
    chamfer3_edges = [part.edges().sort_by_distance(p)[0] for p in [
        (0, -13.3, 5),
    ]]
    chamfer(chamfer3_edges, length=CHAMFER3_SIZE)


solid = part.part
